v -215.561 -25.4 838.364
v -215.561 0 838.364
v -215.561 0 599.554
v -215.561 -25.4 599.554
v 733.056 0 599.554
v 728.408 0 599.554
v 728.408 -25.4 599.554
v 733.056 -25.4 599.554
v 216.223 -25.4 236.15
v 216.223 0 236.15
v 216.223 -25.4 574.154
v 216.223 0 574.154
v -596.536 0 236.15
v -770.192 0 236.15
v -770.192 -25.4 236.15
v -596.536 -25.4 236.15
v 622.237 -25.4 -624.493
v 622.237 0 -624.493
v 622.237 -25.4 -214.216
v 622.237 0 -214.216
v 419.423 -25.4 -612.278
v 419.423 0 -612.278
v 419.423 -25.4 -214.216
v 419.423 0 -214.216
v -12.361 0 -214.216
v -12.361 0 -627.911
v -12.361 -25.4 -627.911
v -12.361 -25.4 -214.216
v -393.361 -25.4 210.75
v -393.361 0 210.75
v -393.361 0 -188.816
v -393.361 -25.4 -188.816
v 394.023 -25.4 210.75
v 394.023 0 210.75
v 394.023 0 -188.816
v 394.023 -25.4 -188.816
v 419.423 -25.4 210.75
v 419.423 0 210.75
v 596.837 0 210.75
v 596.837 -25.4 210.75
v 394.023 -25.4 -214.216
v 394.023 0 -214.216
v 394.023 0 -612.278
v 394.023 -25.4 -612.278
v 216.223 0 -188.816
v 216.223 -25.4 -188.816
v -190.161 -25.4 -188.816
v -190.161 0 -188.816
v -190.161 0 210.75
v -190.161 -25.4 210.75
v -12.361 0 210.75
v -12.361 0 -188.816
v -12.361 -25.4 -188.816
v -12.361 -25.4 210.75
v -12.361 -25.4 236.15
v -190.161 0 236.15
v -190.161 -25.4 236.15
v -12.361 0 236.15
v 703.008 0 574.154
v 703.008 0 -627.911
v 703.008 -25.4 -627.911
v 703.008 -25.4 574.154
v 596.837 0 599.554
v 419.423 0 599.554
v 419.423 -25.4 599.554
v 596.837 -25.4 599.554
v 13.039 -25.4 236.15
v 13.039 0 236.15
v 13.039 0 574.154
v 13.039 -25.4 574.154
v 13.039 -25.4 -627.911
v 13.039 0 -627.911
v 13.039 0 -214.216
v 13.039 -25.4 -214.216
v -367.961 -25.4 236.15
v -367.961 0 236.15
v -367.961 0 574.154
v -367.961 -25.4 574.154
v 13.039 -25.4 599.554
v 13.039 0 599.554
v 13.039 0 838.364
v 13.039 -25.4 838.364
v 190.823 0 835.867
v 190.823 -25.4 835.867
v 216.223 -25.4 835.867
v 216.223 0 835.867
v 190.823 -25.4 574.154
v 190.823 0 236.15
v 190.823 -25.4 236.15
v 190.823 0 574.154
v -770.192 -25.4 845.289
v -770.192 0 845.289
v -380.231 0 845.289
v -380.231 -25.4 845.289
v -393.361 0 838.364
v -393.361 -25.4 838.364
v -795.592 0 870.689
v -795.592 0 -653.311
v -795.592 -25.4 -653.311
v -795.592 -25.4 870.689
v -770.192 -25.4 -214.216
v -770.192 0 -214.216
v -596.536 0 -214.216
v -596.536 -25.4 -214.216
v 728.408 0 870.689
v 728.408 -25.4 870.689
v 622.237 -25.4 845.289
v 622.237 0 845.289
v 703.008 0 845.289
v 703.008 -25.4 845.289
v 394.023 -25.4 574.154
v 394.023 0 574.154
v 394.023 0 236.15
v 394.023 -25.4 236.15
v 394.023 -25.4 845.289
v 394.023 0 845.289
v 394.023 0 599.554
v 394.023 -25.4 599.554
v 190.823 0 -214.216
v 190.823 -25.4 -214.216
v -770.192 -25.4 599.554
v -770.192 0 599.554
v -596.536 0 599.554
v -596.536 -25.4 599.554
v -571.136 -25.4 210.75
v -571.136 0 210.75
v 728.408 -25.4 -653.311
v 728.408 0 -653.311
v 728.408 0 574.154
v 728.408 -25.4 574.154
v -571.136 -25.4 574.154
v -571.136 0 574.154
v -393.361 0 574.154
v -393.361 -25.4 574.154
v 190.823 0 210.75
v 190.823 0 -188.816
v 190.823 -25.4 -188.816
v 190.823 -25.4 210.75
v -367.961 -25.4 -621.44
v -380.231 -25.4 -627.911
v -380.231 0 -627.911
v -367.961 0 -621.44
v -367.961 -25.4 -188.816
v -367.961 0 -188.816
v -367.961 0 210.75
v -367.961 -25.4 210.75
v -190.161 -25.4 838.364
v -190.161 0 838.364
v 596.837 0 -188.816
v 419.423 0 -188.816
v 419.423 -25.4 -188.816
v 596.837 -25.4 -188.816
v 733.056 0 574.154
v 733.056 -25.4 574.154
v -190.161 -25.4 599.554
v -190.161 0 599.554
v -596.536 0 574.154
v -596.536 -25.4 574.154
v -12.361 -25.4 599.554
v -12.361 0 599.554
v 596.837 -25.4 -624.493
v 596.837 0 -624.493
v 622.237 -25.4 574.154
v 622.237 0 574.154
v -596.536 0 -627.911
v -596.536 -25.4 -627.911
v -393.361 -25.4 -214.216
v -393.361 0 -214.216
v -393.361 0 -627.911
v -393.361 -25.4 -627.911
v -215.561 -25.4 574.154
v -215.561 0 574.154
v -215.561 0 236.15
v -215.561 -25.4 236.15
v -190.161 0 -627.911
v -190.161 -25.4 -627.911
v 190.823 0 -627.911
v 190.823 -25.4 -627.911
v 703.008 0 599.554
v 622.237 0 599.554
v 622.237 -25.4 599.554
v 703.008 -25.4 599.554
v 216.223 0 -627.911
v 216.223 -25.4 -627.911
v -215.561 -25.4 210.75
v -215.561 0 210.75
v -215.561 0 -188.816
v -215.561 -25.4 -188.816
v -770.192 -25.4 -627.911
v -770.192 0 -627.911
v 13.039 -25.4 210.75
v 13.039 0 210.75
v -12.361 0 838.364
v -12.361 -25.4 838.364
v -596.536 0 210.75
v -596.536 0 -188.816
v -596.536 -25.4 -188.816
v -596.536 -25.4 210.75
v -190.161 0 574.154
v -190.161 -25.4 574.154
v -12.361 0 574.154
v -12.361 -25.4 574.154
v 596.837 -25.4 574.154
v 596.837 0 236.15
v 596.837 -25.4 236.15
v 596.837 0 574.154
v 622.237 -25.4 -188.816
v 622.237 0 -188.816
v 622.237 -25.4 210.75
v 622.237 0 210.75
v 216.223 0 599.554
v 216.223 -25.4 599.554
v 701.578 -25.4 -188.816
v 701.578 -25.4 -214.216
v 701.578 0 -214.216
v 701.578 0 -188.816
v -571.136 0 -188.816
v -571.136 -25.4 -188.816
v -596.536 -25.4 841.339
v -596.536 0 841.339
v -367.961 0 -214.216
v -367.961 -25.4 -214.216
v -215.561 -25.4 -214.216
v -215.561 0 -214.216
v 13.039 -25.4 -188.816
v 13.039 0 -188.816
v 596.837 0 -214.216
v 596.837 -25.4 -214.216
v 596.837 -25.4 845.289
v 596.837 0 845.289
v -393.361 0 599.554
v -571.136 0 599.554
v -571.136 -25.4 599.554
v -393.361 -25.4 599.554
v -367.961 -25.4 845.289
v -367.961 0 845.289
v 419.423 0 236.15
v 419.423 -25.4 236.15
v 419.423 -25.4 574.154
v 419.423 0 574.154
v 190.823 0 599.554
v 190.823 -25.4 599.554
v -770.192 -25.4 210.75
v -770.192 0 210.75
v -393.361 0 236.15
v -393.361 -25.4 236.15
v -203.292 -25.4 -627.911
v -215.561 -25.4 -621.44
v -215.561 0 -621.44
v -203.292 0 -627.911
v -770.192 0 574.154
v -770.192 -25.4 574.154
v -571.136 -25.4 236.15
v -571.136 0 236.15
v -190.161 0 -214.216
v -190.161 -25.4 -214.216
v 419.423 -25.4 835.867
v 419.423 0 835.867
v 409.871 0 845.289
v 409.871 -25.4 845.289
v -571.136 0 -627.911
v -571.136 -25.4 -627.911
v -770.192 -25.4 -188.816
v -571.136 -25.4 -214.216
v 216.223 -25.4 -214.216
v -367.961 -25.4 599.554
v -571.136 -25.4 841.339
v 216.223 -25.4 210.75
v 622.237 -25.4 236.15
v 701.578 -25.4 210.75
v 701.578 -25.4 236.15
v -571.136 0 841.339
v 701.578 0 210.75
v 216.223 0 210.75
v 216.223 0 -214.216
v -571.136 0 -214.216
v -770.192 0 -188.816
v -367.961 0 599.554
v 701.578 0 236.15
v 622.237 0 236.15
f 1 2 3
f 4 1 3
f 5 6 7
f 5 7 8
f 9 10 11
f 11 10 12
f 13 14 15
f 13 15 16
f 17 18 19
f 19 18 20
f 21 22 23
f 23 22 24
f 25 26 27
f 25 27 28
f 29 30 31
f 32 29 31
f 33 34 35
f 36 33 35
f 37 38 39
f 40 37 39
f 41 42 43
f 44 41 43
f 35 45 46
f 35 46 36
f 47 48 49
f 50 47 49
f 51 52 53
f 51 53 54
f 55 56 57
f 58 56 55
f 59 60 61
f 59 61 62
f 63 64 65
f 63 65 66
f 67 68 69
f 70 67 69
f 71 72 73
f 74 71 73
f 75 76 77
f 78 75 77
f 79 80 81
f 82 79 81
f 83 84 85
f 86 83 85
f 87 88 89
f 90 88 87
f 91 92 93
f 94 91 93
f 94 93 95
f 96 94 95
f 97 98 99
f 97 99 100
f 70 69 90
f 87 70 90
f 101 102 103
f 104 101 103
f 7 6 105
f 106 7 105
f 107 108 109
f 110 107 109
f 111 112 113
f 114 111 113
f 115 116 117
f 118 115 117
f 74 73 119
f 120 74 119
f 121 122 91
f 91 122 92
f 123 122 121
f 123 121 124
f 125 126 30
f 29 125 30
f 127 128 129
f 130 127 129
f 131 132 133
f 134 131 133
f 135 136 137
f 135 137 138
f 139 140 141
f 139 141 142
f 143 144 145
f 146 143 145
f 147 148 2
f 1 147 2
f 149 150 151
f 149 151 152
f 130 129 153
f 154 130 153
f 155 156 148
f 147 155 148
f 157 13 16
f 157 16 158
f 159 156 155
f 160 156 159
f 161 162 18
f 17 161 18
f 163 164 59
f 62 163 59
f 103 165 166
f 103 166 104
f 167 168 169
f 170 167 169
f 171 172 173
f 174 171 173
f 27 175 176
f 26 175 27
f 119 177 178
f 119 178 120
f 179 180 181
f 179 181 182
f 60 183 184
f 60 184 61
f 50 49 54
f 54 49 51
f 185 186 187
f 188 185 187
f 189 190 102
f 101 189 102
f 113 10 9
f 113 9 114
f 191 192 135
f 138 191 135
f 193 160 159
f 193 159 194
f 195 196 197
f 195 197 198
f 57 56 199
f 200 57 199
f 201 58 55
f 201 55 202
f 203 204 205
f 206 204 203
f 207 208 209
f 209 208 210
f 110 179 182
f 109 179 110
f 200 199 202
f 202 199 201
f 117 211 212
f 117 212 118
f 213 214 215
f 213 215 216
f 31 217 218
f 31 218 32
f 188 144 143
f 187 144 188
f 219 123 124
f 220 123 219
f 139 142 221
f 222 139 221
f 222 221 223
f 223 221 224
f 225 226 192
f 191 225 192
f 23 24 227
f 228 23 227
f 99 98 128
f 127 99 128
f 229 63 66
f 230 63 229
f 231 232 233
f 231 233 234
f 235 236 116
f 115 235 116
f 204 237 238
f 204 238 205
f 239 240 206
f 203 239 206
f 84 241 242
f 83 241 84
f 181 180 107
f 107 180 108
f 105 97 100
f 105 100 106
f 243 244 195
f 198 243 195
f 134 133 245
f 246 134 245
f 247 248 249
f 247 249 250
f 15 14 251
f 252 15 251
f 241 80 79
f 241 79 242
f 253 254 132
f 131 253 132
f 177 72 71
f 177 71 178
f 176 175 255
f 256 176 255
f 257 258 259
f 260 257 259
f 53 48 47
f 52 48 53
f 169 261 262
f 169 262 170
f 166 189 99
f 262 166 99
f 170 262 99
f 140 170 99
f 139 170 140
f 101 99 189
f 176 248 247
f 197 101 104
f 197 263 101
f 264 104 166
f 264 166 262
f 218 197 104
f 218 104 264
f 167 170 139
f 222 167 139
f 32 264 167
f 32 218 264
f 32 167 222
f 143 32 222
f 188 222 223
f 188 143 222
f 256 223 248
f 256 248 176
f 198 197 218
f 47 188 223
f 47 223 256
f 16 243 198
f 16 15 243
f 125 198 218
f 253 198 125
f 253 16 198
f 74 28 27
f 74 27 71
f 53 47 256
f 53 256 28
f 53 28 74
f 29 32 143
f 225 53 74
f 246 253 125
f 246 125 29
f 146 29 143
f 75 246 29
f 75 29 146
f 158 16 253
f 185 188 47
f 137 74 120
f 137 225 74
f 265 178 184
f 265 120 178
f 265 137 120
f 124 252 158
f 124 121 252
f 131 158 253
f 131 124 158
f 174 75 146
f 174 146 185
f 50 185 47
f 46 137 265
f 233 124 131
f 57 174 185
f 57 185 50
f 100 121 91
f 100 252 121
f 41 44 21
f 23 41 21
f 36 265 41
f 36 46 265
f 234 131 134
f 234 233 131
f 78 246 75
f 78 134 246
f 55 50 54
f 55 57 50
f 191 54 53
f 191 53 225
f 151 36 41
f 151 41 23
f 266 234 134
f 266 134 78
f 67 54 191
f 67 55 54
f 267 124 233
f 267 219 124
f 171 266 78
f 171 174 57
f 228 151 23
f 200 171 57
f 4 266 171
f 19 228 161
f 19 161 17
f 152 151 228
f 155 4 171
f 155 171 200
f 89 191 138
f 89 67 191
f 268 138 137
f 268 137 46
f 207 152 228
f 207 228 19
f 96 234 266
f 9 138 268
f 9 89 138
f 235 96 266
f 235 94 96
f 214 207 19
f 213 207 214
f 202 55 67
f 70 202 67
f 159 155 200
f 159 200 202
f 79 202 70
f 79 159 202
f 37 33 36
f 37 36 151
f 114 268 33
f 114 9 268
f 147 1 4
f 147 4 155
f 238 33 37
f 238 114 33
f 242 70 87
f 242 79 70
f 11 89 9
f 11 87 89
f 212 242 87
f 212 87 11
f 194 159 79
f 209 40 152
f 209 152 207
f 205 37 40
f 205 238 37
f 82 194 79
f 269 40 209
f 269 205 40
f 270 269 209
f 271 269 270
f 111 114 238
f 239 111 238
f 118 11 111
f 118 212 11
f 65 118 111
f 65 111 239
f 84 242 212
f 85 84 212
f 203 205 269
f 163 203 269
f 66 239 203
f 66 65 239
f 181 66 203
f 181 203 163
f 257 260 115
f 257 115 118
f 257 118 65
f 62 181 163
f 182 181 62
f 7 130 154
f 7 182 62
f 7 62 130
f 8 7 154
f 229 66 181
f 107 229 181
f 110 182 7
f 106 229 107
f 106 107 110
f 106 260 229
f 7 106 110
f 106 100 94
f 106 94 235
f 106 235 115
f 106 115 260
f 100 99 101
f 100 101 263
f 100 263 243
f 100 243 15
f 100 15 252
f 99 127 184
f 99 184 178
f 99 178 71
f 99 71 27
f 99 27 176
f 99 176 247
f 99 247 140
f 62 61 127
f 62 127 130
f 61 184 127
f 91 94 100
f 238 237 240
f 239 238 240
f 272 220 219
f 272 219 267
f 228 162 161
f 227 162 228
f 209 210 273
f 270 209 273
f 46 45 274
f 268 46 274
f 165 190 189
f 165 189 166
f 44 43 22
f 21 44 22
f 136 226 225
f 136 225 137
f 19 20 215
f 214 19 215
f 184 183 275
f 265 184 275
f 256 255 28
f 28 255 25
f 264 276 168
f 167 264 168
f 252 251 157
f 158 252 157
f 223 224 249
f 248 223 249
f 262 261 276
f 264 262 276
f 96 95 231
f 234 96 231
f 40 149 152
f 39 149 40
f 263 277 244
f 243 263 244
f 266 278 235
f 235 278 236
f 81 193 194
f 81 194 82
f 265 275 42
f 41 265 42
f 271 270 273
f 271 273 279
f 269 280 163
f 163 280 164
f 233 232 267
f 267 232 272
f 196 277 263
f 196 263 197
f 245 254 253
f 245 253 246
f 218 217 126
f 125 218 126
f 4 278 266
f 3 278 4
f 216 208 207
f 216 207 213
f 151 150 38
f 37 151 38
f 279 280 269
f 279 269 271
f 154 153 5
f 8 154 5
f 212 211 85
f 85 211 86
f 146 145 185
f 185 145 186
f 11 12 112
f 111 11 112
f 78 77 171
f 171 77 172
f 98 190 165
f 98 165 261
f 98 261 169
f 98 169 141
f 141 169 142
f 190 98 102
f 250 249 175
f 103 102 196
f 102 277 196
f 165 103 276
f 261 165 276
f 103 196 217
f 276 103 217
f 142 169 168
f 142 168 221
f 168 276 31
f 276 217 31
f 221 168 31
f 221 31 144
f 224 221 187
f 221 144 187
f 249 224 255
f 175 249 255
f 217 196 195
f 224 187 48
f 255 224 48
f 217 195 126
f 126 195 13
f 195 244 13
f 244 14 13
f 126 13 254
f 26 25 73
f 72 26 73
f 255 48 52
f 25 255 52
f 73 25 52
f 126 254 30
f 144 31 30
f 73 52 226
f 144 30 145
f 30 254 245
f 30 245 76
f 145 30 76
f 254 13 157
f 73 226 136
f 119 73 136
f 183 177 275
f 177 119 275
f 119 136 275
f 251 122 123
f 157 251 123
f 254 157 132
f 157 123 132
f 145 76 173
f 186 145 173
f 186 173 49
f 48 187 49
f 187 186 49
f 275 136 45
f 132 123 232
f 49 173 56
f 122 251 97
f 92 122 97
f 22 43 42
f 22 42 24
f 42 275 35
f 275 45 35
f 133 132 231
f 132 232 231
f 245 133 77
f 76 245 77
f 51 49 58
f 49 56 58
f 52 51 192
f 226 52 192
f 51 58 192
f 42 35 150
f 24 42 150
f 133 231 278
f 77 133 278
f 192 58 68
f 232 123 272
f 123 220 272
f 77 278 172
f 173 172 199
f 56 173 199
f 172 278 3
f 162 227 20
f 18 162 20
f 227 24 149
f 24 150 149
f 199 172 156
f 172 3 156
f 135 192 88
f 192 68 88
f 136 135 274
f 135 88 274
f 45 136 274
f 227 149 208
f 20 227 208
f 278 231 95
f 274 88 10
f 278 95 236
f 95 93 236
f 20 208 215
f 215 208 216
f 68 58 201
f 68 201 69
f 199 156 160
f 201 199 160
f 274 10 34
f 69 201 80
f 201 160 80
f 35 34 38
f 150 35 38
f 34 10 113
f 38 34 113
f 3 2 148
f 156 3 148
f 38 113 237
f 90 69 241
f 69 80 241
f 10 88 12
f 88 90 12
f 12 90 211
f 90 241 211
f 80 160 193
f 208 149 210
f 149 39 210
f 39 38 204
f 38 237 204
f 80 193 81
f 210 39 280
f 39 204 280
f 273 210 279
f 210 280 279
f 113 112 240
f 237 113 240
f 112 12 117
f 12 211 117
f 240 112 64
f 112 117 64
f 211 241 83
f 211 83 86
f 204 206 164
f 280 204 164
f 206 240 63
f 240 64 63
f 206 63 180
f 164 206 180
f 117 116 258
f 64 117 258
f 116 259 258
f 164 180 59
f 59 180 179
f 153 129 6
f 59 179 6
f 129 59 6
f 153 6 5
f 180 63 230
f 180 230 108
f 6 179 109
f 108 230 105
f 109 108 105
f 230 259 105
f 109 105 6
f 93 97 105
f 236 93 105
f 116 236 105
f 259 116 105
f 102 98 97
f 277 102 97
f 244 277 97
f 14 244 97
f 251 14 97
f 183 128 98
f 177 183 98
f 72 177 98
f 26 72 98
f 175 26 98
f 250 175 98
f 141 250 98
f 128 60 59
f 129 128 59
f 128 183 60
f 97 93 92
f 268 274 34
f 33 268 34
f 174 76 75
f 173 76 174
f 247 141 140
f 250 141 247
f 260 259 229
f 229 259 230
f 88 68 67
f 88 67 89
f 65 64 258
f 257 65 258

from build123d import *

# Parameters (mm, degrees)
F0_W     = 1524
F0_H     = 1524
F0_W_2   = 1473.2
F0_H_2   = 1473.2
F1_DEPTH = 25.4
F2_W     = 25.4
F2_H     = 1473.2
F2_H_2   = 1468.964992
F2_H_3   = 1466.467655
F2_H_4   = 1472.886331
F3_DEPTH = 25.4
F4_W     = 1471.939683
F4_H     = 25.4
F4_W_2   = 1503.417969
F5_DEPTH = 25.4


with BuildPart() as f1:
    # F0 (on Front) → F1 (new body)
    with BuildSketch(Plane.XZ):
        with Locations((-33.591984, 108.689165)):
            Rectangle(F0_W, F0_H)
        with Locations((-33.591984, 108.689165)):
            Rectangle(F0_W_2, F0_H_2, mode=Mode.SUBTRACT)
    extrude(amount=F1_DEPTH)

    # F2 (on Front) → F3 (join)
    with BuildSketch(Plane.XZ):
        with Locations((-583.836417, 104.738611)):
            Rectangle(F2_W, F2_H)
        Polygon((-367.961303, 851.760401), (-393.361303, 838.36392), (-393.361303, -634.83608), (-367.961303, -621.439599), align=None)
        Polygon((-190.161303, -634.83608), (-190.161303, 838.36392), (-215.561303, 838.36392), (-215.561303, -621.439599), align=None)
        with Locations((0.338697, 103.881424)):
            Rectangle(F2_W, F2_H_2)
        with Locations((203.52335, 102.632756)):
            Rectangle(F2_W, F2_H_3)
        Polygon((419.42335, -612.278187), (419.42335, 835.866583), (394.02335, 860.921813), (394.02335, -612.278187), align=None)
        with Locations((609.536889, 111.949723)):
            Rectangle(F2_W, F2_H_4)
    extrude(amount=F3_DEPTH)

    # F4 (on Front) → F5 (join)
    with BuildSketch(Plane.XZ):
        with Locations((-34.39182, 223.449667)):
            Rectangle(F4_W, F4_H)
        with Locations((-34.39182, -201.515604)):
            Rectangle(F4_W, F4_H)
        with Locations((-18.652677, 586.853881)):
            Rectangle(F4_W_2, F4_H)
    extrude(amount=F5_DEPTH)


solid = f1.part
